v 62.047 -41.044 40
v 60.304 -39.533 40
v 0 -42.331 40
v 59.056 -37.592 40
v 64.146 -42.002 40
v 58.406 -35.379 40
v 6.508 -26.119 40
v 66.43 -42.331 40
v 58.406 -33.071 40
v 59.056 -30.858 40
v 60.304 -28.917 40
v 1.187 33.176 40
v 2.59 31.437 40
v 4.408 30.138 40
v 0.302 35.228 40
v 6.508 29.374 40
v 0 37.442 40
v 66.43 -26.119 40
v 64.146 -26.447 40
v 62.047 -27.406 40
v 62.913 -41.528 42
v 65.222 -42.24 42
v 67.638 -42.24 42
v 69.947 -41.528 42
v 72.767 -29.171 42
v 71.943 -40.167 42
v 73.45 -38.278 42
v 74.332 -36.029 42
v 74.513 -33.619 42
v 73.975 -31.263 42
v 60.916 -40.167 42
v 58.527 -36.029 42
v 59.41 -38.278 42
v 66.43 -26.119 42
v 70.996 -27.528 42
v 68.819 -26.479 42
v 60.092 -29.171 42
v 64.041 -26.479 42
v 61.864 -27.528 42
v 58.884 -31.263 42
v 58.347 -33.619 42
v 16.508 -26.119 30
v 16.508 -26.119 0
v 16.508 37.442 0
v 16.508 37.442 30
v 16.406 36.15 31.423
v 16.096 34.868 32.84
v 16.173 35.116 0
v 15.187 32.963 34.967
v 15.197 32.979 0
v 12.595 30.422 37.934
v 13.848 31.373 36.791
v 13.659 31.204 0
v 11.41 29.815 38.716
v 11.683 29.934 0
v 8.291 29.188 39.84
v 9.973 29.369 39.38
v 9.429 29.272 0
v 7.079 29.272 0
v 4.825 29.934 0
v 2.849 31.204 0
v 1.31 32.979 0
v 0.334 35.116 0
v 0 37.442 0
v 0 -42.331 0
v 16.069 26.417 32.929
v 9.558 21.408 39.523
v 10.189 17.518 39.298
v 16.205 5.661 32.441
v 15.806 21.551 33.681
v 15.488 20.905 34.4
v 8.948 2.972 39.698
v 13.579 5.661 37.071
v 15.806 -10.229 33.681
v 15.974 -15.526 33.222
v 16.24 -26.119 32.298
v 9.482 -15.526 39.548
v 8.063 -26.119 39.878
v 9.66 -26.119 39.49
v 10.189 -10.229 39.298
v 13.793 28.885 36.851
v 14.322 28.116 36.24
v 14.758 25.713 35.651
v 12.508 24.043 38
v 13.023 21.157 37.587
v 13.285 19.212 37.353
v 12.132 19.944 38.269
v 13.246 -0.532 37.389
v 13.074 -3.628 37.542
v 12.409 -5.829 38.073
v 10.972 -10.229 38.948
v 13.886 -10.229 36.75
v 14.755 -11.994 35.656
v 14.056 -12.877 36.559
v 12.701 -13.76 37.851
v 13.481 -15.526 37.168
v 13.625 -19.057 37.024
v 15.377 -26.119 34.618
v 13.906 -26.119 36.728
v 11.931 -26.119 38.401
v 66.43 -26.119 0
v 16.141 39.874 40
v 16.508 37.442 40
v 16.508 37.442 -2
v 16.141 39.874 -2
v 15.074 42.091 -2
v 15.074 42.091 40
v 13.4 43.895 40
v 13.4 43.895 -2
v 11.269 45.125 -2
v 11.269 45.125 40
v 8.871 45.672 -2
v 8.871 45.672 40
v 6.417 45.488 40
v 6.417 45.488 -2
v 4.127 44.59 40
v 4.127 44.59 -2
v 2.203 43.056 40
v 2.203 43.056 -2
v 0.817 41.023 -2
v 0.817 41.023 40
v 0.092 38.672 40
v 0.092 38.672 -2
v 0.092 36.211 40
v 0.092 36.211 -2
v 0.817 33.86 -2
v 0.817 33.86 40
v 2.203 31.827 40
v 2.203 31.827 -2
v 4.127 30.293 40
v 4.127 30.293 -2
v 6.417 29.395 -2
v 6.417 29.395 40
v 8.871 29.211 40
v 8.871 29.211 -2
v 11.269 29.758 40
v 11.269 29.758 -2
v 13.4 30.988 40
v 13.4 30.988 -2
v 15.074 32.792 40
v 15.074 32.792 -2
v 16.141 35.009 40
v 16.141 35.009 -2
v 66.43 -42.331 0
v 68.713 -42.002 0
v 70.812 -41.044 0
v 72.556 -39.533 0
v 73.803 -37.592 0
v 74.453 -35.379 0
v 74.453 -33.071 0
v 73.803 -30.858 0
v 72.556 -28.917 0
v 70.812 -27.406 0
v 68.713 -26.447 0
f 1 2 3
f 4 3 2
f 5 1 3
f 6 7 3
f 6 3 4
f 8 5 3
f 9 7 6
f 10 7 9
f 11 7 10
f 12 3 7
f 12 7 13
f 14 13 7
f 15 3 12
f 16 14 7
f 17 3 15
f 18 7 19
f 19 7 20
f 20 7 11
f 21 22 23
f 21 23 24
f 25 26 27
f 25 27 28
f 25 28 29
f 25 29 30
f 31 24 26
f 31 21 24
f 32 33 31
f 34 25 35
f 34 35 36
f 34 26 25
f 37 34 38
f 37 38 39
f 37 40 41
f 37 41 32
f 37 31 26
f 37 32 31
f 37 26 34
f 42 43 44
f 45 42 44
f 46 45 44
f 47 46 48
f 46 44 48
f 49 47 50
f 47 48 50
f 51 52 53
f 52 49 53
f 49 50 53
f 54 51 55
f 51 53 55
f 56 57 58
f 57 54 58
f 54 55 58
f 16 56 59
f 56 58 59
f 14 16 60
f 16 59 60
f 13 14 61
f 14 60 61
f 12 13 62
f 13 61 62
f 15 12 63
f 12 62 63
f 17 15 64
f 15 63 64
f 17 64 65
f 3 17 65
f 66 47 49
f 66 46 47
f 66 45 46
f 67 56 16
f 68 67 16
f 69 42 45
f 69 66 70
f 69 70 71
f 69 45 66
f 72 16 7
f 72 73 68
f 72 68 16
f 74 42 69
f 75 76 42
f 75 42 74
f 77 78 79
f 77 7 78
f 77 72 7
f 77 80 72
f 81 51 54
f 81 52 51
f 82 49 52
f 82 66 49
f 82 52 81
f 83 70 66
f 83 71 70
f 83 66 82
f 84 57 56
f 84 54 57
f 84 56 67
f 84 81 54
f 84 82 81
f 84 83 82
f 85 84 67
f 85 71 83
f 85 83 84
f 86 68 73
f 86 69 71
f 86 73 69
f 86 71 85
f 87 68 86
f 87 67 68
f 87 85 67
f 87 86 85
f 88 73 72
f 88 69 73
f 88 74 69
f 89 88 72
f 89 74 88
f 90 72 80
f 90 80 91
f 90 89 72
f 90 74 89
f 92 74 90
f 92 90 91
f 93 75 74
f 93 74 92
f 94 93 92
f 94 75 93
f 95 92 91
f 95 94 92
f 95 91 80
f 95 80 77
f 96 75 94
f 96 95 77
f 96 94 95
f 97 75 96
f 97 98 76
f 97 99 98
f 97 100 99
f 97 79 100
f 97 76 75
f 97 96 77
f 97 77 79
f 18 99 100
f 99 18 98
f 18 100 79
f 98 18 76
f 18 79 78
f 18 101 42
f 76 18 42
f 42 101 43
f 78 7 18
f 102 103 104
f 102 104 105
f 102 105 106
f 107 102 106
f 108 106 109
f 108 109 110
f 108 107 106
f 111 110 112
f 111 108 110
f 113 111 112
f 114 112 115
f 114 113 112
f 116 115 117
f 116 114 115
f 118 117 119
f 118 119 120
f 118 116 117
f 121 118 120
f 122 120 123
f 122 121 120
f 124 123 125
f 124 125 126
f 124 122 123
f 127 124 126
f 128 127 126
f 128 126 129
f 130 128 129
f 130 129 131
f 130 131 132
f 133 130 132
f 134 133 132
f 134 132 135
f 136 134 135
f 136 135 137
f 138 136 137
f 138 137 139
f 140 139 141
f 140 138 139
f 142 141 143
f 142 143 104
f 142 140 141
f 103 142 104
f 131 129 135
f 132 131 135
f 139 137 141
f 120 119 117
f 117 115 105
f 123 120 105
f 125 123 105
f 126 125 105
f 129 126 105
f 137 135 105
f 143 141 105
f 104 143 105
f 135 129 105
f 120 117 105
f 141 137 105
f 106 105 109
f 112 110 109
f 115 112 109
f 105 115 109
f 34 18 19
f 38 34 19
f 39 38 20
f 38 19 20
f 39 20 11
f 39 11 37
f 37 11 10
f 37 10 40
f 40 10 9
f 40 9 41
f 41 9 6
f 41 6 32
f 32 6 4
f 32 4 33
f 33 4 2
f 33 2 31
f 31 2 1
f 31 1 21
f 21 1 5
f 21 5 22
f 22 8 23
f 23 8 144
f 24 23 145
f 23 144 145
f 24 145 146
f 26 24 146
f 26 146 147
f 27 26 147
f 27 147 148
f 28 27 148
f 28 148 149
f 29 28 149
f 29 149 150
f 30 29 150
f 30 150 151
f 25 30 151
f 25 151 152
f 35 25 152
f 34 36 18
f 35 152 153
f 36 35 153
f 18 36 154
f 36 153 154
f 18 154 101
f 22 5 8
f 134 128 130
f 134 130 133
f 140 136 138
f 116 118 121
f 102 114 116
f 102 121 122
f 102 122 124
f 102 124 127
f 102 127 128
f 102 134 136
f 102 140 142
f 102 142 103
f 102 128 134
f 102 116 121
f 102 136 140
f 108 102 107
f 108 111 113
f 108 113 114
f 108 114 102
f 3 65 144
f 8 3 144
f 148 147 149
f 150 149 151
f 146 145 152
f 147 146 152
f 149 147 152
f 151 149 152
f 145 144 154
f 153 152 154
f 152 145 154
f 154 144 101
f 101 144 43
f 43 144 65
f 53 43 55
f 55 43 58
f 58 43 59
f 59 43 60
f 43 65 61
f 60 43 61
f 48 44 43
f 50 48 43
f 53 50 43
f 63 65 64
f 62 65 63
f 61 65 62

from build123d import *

# Parameters (mm, degrees)
BOSS_EXTRUDE1_DEPTH = 40
SKETCH2_R           = 8.25386472
BOSS_EXTRUDE2_DEPTH = 42
SKETCH3_R           = 8.105899881
BOSS_EXTRUDE3_DEPTH = 42
FILLET4_START       = -26.119010727
FILLET4_DEPTH       = 64.119010727


with BuildPart() as part:
    # Sketch1 → Boss-Extrude1 (new body)
    with BuildSketch(Plane.XY):
        with BuildLine():
            Line((0, 37.441537545), (0, -42.330810489))
            Line((0, -42.330810489), (66.429779499, -42.330810489))
            ThreePointArc((66.429779499, -42.330810489), (58.323879619, -34.224910608), (66.429779499, -26.119010727))
            Line((66.429779499, -26.119010727), (16.50772944, -26.119010727))
            Line((16.50772944, -26.119010727), (16.50772944, 37.441537545))
            ThreePointArc((16.50772944, 37.441537545), (8.25386472, 29.187672825), (0, 37.441537545))
        make_face()
    extrude(amount=BOSS_EXTRUDE1_DEPTH)

    # Sketch3 → Boss-Extrude3 (add)
    with BuildSketch(Plane.XY):
        with Locations(Location((66.429779499, -34.224910608, 0), (0, 0, 90))):
            Circle(SKETCH3_R)
    extrude(amount=BOSS_EXTRUDE3_DEPTH)

    # Fillet4: read off the stored shape, not the designer's step
    # Fillet4 outline → Fillet4 (cut)
    with BuildSketch(Plane(origin=(0, 0, 0), x_dir=(1, 0, 0), z_dir=(0, 1, 0)).offset(FILLET4_START)):
        with BuildLine():
            Line((16.50772944, -40), (16.50772944, -30))
            add(Edge.make_bspline(
                [(16.50772944, -30), (16.50772944, -40), (6.50772944, -40)],
                knots=[0, 0, 0, 1, 1, 1], degree=2, weights=[1, 0.707106781, 1]))
            Line((6.50772944, -40), (16.50772944, -40))
        make_face()
    extrude(amount=FILLET4_DEPTH, mode=Mode.SUBTRACT)


with BuildPart() as body_2:
    # Sketch2 → Boss-Extrude2 (new body)
    with BuildSketch(Plane.XY.offset(40)):
        with Locations((8.25386472, 37.441537545)):
            Circle(SKETCH2_R)
    extrude(amount=-BOSS_EXTRUDE2_DEPTH)


solid = Compound([part.part, body_2.part])
